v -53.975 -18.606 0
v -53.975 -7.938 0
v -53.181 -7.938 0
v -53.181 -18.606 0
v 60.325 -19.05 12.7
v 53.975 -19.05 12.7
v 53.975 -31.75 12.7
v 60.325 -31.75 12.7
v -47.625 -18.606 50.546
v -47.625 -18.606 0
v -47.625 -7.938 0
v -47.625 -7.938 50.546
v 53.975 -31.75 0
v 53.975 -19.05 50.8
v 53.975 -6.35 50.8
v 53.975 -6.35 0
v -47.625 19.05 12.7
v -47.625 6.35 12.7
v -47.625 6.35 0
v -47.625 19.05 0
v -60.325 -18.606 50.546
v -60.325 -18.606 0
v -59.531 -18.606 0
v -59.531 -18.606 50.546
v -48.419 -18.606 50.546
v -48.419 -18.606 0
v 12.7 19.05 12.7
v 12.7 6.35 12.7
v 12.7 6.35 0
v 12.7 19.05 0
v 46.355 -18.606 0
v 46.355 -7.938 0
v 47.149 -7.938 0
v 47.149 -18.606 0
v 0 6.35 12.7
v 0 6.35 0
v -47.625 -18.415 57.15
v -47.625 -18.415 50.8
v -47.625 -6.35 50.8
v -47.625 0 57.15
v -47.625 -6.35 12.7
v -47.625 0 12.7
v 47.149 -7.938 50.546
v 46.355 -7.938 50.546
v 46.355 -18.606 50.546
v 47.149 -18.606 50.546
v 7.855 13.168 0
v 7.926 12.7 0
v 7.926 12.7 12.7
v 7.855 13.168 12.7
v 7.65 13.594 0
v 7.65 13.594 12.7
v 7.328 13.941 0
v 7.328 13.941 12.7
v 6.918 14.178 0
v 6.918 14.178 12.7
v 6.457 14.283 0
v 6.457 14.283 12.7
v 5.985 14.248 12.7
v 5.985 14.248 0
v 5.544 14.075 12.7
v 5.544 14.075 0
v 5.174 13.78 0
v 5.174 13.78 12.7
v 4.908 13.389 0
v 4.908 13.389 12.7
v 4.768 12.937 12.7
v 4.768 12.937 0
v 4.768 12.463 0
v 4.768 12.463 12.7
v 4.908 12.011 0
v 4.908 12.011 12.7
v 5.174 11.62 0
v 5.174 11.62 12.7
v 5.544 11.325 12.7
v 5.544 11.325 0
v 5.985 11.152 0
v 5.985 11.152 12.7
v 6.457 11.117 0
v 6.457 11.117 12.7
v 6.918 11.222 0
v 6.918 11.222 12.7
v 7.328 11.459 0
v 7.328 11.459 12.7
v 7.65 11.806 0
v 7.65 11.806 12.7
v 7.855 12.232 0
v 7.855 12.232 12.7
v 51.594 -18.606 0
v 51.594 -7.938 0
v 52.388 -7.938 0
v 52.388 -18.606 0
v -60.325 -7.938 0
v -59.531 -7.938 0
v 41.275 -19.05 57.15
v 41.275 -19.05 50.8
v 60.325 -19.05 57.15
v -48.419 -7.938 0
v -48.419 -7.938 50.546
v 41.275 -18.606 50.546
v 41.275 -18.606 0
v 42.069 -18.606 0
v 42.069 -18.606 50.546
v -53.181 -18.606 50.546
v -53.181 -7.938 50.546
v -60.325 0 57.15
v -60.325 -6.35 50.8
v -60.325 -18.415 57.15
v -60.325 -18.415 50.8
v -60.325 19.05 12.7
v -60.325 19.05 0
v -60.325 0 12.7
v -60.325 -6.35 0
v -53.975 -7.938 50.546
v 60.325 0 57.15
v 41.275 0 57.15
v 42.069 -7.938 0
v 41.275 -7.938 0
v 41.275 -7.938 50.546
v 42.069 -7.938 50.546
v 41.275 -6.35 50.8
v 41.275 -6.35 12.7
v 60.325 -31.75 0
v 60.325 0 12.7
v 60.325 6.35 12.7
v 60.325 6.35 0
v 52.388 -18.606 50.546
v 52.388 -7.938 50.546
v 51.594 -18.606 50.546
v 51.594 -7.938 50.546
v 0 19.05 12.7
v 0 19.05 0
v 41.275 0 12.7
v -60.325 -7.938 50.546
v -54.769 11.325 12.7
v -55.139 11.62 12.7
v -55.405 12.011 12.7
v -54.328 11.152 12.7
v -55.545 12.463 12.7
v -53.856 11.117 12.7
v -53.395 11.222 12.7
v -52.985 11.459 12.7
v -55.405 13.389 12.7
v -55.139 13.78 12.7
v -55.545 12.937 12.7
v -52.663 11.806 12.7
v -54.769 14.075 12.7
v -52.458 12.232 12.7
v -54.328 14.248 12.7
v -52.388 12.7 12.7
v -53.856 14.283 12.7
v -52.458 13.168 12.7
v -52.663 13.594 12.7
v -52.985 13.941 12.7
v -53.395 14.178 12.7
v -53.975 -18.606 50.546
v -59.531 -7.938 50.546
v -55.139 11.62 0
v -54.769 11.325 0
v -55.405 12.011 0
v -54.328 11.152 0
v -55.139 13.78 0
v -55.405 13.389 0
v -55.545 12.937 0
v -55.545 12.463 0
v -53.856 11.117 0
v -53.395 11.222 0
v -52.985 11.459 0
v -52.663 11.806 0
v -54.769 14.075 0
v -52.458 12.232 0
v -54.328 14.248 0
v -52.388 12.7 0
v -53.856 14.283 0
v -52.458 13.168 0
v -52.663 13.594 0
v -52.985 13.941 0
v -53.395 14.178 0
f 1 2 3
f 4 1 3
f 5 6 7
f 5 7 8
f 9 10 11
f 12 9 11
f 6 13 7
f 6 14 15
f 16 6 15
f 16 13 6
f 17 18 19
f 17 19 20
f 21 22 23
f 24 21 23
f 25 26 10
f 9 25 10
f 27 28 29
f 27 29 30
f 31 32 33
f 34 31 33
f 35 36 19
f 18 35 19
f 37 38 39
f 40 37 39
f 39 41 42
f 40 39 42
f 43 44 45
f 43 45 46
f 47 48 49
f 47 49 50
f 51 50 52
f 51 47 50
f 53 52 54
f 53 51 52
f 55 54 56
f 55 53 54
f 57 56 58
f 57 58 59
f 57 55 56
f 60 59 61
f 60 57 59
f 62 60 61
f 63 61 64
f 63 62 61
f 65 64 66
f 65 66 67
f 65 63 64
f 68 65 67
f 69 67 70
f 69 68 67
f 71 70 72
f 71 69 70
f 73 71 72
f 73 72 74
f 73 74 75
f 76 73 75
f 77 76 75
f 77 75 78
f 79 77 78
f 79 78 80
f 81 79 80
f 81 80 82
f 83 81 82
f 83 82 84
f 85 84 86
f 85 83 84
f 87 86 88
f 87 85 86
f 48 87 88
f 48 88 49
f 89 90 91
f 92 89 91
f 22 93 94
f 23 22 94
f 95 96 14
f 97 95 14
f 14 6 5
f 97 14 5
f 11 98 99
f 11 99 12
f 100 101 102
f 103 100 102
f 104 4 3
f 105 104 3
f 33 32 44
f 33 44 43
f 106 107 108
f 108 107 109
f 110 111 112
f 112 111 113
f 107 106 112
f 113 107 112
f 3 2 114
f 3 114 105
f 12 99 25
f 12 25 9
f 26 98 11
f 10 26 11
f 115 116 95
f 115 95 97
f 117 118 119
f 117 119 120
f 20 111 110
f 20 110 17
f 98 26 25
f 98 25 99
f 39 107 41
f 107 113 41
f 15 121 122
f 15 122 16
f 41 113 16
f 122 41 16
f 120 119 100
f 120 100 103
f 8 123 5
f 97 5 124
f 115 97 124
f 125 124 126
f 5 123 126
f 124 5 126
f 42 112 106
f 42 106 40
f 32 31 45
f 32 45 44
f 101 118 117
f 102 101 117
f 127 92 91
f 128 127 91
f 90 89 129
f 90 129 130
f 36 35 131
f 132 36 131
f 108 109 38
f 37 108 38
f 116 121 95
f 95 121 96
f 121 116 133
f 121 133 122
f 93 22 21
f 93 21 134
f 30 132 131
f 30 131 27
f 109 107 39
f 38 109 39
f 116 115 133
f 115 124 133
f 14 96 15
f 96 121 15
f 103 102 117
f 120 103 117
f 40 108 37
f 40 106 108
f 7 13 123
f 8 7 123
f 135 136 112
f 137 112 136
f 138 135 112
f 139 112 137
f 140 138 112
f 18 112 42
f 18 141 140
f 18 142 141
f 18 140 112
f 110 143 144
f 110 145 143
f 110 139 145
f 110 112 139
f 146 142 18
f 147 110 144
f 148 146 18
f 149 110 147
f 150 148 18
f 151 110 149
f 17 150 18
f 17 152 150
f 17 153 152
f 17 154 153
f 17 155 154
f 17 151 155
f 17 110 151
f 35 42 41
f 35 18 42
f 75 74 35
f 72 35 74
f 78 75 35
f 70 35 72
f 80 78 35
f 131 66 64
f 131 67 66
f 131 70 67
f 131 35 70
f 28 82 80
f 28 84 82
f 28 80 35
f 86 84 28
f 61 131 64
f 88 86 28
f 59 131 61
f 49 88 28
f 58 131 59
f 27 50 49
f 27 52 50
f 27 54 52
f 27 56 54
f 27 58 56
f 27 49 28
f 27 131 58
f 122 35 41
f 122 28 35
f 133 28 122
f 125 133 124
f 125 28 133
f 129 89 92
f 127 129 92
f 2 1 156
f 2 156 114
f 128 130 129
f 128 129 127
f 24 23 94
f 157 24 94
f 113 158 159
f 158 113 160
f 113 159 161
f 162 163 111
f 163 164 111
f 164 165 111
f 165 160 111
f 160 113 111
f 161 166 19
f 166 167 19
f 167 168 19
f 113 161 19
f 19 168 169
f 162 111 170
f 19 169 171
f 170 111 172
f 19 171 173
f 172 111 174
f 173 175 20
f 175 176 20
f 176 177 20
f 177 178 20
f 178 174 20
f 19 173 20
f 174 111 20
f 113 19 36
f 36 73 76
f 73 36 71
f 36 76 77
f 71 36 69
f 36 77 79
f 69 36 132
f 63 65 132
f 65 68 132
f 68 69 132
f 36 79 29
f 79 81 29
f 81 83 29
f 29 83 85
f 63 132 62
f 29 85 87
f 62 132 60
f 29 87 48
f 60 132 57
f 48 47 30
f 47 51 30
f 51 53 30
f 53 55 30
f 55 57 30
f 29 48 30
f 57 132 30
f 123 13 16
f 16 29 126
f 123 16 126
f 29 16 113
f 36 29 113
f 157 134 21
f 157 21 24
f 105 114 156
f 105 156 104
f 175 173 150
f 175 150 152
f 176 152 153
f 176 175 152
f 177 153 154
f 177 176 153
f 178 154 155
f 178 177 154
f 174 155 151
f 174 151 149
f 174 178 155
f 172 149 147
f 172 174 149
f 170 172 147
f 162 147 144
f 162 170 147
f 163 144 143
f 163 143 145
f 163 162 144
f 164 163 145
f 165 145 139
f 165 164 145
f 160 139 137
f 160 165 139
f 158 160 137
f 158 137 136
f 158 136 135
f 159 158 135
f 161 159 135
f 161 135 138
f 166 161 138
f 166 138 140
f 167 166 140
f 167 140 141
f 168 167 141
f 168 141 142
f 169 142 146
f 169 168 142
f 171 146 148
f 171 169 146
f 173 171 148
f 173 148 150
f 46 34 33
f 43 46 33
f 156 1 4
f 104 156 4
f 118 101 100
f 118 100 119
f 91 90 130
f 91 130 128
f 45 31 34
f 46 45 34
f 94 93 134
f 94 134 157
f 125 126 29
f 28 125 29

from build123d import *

# Parameters (mm, degrees)
F0_W     = 12.7
F0_H     = 12.7
F0_R     = 1.5875
F0_W_2   = 6.35
F0_H_2   = 25.4
F1_DEPTH = 12.7
F0_W_3   = 0.79375
F0_H_3   = 10.668
F2_DEPTH = 50.546
F3_W     = 12.7
F3_H     = 6.35
F4_DEPTH = 38.1
F5_W     = 12.7
F5_H     = 12.065
F5_H_2   = 6.35
F6_DEPTH = 6.35
F7_W     = 12.7
F7_H     = 12.7
F8_DEPTH = 6.35


with BuildPart() as f1:
    # F0 (on Top) → F1 (new body)
    with BuildSketch(Plane.XY):
        with Locations((-53.975, 12.7)):
            Rectangle(F0_W, F0_H)
        with Locations((-53.975, 12.7)):
            Circle(F0_R, mode=Mode.SUBTRACT)
        Polygon((53.975, -6.35), (60.325, -6.35), (60.325, 6.35), (12.7, 6.35), (0, 6.35), (-47.625, 6.35), (-60.325, 6.35), (-60.325, -6.35), align=None)
        with Locations((6.35, 12.7)):
            Rectangle(F0_W, F0_H)
        with Locations((6.3381763175, 12.7)):
            Circle(F0_R, mode=Mode.SUBTRACT)
        with Locations((57.15, -19.05)):
            Rectangle(F0_W_2, F0_H_2)
    extrude(amount=F1_DEPTH)

    # F3 (on face) → F4 (join)
    with BuildSketch(Plane.XY.offset(12.7)):
        with Locations((-53.975, -3.175)):
            Rectangle(F3_W, F3_H)
        with Locations((47.625, -3.175)):
            Rectangle(F3_W, F3_H)
        Polygon((53.975, 0), (53.975, -6.35), (53.975, -19.05), (60.325, -19.05), (60.325, 0), align=None)
    extrude(amount=F4_DEPTH)

    # F5 (on face) → F6 (join)
    with BuildSketch(Plane.XY.offset(50.8)):
        with Locations((-53.975, -12.3825)):
            Rectangle(F5_W, F5_H)
        with Locations((-53.975, -3.175)):
            Rectangle(F5_W, F5_H_2)
    extrude(amount=F6_DEPTH)

    # F7 (on face) → F8 (join)
    with BuildSketch(Plane.XY.offset(50.8)):
        Polygon((60.325, -19.05), (60.325, 0), (41.275, 0), (41.275, -6.35), (53.975, -6.35), (53.975, -19.05), align=None)
        with Locations((47.625, -12.7)):
            Rectangle(F7_W, F7_H)
    extrude(amount=F8_DEPTH)


with BuildPart() as f2:
    # F0 (on Top) → F2 (new body)
    with BuildSketch(Plane.XY):
        with Locations((-59.928125, -13.2715)):
            Rectangle(F0_W_3, F0_H_3)
    extrude(amount=F2_DEPTH)


with BuildPart() as f2b:
    # F0 (on Top) → F2, piece 2 (new body)
    with BuildSketch(Plane.XY):
        with Locations((-53.578125, -13.2715)):
            Rectangle(F0_W_3, F0_H_3)
    extrude(amount=F2_DEPTH)


with BuildPart() as f2c:
    # F0 (on Top) → F2, piece 3 (new body)
    with BuildSketch(Plane.XY):
        with Locations((-48.021875, -13.2715)):
            Rectangle(F0_W_3, F0_H_3)
    extrude(amount=F2_DEPTH)


with BuildPart() as f2d:
    # F0 (on Top) → F2, piece 4 (new body)
    with BuildSketch(Plane.XY):
        with Locations((41.671875, -13.2715)):
            Rectangle(F0_W_3, F0_H_3)
    extrude(amount=F2_DEPTH)


with BuildPart() as f2e:
    # F0 (on Top) → F2, piece 5 (new body)
    with BuildSketch(Plane.XY):
        with Locations((46.751875, -13.2715)):
            Rectangle(F0_W_3, F0_H_3)
    extrude(amount=F2_DEPTH)


with BuildPart() as f2f:
    # F0 (on Top) → F2, piece 6 (new body)
    with BuildSketch(Plane.XY):
        with Locations((51.990625, -13.2715)):
            Rectangle(F0_W_3, F0_H_3)
    extrude(amount=F2_DEPTH)


solid = Compound([f1.part, f2.part, f2b.part, f2c.part, f2d.part, f2e.part, f2f.part])
